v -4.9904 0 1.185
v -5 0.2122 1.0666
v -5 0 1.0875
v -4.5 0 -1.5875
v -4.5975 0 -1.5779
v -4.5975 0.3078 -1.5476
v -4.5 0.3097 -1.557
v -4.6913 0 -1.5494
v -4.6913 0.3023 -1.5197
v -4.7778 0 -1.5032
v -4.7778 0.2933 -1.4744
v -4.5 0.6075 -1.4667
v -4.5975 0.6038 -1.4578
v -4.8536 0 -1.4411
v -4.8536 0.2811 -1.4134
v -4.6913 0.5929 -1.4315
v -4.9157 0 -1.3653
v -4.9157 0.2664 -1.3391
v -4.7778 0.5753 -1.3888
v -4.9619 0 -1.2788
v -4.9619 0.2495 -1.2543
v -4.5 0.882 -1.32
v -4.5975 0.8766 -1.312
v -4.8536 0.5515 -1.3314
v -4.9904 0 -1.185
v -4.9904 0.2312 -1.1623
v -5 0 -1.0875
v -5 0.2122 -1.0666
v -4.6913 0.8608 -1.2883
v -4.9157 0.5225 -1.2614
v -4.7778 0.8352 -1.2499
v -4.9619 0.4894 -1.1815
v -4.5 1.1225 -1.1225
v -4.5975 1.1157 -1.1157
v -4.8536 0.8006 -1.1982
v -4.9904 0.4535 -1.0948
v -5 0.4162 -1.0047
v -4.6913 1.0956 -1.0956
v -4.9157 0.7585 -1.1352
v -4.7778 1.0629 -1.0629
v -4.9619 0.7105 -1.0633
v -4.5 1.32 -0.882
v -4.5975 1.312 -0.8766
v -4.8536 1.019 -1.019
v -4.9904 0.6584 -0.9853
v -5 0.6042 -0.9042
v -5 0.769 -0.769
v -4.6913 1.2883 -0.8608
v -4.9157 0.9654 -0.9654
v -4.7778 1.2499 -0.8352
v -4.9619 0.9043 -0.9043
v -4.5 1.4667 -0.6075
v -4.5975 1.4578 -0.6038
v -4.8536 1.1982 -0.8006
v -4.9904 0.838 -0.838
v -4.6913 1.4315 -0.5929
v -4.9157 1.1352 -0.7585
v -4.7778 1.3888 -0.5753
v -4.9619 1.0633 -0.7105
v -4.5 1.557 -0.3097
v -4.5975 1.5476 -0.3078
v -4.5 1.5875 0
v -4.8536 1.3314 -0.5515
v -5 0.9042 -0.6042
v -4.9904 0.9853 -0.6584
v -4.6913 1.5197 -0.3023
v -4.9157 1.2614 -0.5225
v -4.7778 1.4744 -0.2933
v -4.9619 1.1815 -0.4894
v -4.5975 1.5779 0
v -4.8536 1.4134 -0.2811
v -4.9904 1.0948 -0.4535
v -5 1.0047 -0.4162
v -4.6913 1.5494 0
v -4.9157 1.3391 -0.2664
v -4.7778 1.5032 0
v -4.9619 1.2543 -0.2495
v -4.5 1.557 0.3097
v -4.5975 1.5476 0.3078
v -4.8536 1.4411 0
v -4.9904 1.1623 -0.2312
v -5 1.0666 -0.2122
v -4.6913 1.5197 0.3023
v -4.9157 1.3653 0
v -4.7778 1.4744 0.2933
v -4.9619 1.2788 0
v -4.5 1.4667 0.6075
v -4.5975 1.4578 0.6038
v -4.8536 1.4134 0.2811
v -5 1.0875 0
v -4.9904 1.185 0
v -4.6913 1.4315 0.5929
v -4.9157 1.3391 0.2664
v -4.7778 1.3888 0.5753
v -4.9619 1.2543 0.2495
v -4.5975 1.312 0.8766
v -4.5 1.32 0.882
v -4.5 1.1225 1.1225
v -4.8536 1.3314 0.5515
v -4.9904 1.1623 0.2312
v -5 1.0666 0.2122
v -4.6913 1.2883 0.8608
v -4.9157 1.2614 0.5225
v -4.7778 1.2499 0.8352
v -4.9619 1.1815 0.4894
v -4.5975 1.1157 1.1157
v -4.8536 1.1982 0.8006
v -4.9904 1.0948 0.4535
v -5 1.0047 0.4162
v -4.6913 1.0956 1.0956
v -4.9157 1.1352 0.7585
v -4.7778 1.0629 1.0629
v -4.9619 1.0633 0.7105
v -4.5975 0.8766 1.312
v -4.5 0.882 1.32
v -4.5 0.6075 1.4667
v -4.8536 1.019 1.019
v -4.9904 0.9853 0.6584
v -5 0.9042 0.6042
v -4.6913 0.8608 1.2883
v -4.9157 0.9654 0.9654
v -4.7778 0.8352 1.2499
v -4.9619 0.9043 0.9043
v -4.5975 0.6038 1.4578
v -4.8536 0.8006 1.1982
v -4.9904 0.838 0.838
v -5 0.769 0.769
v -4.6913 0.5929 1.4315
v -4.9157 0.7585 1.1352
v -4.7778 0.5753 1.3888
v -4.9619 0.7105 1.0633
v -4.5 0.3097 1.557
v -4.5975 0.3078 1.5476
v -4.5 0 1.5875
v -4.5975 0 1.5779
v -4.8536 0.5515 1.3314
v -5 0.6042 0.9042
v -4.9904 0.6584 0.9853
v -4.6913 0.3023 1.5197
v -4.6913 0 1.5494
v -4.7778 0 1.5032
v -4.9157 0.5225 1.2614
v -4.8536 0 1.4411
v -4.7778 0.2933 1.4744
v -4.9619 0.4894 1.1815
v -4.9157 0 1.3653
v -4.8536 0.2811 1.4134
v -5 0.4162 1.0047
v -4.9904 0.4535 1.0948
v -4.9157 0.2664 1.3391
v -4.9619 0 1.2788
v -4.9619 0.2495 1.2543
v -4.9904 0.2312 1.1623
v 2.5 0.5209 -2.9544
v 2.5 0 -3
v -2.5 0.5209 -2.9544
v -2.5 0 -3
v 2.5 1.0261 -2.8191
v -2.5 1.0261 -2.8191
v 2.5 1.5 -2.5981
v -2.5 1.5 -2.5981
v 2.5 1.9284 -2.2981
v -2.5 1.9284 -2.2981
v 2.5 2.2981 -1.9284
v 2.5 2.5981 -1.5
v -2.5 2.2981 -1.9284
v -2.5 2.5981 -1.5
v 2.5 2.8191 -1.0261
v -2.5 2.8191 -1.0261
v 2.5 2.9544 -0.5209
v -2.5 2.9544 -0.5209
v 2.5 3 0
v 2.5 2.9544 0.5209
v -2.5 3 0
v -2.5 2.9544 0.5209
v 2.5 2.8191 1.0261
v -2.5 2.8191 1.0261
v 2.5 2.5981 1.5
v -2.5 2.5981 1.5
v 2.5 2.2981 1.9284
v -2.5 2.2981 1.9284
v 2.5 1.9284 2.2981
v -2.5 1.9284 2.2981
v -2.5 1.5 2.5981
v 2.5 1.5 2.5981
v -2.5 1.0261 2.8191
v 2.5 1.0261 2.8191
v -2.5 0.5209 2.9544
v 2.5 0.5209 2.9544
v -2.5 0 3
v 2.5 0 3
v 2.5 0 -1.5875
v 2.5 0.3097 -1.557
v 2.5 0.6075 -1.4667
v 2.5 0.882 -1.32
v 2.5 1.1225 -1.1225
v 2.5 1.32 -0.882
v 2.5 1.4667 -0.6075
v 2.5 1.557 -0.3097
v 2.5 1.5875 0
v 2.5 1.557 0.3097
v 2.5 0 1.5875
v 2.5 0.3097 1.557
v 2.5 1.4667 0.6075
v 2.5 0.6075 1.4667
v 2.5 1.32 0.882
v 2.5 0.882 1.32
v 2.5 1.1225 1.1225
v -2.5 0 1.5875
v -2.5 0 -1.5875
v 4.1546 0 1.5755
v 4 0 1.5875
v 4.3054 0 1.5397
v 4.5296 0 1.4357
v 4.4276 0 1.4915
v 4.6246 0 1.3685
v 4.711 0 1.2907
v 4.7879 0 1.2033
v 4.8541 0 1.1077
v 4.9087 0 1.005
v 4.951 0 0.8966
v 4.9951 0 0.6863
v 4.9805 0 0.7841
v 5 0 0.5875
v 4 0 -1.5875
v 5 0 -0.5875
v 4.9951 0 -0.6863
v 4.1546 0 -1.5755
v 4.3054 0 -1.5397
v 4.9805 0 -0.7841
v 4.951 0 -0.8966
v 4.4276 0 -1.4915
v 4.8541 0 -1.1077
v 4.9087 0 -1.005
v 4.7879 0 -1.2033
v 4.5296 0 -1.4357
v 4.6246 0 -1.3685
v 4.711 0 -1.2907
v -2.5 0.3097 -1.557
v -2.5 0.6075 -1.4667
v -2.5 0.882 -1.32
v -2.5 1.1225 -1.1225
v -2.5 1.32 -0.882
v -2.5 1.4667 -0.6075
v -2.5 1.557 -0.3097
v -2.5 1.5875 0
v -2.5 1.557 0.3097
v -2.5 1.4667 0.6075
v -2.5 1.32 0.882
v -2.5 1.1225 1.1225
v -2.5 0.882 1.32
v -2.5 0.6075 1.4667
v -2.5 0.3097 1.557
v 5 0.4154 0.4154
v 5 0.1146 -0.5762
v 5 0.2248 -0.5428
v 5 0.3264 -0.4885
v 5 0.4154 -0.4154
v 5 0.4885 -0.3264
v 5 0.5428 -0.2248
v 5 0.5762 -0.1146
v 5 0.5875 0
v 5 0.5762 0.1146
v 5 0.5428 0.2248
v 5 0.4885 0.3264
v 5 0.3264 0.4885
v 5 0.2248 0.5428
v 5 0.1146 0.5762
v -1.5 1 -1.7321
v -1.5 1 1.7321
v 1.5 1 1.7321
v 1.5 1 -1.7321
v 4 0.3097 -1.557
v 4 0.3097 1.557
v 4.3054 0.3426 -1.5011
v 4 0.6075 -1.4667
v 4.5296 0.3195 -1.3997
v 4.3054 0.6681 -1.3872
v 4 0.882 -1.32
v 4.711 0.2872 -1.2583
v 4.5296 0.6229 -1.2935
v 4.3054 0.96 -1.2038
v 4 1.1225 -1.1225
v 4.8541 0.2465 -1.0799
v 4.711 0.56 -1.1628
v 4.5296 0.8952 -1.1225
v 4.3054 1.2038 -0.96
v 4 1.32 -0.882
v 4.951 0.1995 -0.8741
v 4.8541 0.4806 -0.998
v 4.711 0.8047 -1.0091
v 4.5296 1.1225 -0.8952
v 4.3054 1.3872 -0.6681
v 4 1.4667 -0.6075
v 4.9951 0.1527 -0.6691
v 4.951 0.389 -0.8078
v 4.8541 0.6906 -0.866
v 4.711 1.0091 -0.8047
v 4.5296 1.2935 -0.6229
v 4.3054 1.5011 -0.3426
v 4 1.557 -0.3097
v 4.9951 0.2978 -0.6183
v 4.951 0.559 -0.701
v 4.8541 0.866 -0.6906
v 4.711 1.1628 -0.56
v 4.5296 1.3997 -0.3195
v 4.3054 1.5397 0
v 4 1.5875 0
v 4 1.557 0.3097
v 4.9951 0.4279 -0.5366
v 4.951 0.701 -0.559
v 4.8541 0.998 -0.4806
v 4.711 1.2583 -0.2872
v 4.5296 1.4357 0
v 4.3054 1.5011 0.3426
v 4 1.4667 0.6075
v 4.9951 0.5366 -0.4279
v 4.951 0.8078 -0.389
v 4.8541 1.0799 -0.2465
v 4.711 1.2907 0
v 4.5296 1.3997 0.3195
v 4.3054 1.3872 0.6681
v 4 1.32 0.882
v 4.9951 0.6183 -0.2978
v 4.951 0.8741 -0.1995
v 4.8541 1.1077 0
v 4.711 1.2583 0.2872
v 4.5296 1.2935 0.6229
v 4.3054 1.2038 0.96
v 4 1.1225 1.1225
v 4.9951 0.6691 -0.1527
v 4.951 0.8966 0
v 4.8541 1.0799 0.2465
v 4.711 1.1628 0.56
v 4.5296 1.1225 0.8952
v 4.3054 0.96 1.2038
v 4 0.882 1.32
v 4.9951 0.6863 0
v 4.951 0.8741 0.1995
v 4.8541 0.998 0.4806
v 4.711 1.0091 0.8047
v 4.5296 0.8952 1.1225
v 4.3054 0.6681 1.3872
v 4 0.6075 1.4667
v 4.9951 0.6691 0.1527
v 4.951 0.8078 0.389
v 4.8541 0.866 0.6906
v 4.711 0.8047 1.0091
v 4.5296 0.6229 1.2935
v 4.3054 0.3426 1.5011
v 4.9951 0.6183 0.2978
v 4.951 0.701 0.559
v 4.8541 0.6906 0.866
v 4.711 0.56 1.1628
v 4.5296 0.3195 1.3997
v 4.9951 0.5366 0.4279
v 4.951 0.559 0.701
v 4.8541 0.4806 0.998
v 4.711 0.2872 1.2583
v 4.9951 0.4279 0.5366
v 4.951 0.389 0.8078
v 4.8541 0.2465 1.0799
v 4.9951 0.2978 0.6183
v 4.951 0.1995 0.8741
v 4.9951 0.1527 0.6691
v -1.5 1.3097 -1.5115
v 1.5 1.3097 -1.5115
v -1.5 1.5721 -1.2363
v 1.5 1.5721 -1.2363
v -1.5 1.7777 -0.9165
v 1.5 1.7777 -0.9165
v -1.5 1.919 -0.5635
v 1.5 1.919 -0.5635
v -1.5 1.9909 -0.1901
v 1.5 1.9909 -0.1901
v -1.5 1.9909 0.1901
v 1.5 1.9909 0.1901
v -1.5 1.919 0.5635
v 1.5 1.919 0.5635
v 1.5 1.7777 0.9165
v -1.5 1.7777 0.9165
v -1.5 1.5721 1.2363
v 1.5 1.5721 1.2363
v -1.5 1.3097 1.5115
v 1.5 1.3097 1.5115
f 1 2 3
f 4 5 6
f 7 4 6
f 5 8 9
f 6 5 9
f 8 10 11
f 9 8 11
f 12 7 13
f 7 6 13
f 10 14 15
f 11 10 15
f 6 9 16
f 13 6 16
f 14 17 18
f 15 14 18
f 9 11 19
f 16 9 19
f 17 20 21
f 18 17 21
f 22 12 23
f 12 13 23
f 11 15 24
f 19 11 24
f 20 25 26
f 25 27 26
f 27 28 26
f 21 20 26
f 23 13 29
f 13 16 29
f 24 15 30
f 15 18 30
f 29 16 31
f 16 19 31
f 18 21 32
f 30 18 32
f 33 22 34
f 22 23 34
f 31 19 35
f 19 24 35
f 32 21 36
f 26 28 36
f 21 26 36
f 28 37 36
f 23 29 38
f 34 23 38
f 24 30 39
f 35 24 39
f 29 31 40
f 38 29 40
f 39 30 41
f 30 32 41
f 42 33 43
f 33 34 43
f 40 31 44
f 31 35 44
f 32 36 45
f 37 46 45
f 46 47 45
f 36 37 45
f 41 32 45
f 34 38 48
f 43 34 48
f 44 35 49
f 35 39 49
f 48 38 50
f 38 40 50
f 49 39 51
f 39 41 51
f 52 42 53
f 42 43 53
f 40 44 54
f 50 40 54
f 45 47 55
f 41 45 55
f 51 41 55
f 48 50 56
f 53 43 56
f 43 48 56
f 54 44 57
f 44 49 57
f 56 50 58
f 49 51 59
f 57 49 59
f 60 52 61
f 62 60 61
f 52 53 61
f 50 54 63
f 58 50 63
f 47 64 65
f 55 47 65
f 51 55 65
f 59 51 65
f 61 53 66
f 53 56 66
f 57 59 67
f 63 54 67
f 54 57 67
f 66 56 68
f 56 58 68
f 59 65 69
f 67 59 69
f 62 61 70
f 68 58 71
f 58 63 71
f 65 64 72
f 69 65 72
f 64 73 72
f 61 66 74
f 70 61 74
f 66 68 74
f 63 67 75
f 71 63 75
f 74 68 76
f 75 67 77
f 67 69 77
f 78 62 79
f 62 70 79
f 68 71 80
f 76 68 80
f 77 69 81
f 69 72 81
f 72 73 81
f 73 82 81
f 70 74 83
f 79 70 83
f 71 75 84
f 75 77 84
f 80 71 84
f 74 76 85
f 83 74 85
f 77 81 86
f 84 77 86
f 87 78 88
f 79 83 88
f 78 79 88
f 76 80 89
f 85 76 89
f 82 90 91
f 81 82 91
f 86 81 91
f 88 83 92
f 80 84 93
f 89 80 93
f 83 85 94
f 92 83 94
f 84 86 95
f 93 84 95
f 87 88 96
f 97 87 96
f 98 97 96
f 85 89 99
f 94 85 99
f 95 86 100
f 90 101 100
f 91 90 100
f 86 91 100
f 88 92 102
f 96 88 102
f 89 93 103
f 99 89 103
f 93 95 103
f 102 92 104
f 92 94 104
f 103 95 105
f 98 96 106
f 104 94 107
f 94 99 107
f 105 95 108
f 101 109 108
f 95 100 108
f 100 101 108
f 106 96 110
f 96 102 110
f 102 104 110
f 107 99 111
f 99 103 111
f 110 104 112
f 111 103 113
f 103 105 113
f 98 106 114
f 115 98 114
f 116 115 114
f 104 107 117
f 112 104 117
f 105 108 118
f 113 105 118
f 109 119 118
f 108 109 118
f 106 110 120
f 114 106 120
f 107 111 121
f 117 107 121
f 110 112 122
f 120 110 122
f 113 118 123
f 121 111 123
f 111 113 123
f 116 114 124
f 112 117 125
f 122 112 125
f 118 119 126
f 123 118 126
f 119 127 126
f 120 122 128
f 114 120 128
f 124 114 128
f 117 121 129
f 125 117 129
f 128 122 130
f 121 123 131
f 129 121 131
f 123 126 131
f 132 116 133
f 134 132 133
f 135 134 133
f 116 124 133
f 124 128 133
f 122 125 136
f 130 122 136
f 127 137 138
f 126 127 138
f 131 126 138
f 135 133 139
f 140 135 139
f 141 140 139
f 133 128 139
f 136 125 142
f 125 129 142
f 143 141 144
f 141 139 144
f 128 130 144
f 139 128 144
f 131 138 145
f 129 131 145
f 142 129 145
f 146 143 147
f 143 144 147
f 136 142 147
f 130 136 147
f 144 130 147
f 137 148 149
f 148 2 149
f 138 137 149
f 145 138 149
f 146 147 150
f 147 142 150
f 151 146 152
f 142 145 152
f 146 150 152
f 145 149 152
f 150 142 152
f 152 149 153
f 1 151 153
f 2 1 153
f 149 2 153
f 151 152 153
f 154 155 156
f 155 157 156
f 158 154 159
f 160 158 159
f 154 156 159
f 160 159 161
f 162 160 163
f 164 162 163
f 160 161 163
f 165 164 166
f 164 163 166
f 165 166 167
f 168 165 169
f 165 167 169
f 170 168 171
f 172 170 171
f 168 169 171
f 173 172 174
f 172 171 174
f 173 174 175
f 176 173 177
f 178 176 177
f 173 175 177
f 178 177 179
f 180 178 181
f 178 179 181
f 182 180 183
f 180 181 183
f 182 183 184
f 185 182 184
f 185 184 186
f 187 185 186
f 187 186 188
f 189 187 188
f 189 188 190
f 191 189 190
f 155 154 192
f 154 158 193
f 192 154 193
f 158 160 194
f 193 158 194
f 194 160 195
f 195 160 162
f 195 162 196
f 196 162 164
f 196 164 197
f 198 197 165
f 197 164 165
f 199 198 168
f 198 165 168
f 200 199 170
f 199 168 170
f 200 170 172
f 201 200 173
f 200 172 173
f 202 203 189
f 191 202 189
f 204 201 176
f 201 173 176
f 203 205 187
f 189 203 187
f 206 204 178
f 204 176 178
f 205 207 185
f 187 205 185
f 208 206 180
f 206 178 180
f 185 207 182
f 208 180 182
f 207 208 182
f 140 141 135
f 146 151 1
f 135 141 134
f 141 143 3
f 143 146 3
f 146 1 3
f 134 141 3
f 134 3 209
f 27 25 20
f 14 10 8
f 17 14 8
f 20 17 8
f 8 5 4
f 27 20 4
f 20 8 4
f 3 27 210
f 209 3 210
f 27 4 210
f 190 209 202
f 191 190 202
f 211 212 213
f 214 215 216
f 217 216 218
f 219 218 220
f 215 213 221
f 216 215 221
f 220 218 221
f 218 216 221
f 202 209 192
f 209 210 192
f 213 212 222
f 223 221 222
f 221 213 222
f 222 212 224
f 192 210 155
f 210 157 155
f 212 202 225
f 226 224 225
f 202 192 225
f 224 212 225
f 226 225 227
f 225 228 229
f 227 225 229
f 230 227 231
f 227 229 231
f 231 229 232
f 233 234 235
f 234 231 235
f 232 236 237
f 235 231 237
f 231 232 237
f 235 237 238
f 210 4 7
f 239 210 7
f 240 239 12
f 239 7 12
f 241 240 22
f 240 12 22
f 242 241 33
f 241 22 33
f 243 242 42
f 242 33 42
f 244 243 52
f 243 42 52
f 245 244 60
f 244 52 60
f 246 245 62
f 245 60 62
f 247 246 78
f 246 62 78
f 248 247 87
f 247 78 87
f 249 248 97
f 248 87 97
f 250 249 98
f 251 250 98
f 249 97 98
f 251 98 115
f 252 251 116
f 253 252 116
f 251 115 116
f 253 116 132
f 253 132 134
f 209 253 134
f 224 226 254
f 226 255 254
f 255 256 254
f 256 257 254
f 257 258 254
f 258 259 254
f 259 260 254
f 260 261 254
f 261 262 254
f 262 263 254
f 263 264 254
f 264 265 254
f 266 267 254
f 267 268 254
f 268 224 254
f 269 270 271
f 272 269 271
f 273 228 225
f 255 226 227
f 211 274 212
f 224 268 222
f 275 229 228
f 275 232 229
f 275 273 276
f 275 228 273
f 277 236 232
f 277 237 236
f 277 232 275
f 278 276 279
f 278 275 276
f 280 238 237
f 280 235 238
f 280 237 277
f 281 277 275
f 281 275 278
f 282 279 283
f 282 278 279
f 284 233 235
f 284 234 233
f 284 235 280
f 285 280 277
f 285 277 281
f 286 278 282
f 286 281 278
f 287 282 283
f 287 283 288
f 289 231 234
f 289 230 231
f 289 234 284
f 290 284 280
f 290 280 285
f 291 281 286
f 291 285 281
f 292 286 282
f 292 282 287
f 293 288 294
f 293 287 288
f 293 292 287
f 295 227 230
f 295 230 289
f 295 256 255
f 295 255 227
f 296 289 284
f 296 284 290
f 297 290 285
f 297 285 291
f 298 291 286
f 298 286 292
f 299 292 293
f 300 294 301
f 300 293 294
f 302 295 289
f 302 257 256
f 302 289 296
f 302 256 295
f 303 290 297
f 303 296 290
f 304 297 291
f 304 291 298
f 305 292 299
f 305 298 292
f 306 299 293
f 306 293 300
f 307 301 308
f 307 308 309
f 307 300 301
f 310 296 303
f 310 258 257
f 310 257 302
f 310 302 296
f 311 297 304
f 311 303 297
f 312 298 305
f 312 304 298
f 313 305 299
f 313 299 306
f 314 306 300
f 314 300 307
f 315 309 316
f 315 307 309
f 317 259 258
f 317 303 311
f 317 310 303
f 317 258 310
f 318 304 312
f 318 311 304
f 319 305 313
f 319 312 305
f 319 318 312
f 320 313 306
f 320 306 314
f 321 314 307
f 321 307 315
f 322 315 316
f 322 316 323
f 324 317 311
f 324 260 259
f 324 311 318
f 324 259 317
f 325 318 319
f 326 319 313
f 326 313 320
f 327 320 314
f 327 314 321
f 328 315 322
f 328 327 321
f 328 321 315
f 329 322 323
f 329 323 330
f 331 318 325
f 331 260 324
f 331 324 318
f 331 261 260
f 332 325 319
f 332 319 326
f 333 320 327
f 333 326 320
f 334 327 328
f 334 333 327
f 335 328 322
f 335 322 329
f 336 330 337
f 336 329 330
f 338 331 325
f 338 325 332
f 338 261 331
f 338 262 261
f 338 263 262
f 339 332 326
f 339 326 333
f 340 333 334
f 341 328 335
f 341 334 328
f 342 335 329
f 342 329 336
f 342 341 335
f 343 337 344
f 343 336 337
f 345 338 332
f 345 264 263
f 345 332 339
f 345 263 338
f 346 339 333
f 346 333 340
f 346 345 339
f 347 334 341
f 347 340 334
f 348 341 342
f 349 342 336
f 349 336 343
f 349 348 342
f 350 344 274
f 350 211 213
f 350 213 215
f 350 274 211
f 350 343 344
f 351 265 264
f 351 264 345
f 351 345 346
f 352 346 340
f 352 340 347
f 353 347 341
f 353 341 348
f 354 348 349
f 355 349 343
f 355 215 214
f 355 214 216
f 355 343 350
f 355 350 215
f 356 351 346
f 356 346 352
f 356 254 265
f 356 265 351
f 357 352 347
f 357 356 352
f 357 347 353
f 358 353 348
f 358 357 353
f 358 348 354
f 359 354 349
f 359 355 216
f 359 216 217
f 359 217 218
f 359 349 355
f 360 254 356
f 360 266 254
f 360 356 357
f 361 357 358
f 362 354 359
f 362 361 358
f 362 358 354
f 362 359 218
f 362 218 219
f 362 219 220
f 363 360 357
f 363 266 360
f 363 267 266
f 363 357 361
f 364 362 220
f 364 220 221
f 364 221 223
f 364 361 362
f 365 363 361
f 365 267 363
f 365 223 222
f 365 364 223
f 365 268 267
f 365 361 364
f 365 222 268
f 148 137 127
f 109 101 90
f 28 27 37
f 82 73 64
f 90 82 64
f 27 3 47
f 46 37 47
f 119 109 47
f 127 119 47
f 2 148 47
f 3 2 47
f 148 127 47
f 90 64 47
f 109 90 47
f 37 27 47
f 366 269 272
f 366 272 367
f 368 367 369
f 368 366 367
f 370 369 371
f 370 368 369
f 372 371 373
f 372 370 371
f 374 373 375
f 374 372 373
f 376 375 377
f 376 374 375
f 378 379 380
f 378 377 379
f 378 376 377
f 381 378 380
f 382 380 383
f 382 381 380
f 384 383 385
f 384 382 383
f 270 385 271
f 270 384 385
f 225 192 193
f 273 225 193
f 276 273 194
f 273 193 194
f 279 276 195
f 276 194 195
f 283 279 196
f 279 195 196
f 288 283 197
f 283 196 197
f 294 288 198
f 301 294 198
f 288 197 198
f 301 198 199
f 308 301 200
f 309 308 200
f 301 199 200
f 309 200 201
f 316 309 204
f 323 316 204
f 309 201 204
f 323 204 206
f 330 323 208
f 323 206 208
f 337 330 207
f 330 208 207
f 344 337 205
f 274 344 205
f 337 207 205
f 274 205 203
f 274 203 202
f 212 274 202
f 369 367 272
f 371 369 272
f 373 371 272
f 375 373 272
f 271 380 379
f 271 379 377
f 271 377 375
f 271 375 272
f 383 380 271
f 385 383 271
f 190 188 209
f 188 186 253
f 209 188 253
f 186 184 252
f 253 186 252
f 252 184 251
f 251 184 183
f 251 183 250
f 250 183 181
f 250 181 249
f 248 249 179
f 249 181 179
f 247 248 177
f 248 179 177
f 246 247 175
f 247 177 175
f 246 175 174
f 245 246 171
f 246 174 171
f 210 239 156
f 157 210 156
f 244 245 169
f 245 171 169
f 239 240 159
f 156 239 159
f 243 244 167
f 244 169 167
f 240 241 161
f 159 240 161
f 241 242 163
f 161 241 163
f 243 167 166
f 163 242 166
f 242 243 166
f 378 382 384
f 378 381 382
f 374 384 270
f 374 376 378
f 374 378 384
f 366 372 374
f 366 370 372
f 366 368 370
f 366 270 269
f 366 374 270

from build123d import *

# Parameters (mm, degrees)
F1_ANGLE_BACK = 90
F1_ANGLE      = 180
F2_T          = 1
F2_T4_ANGLE   = 180.000000001
F2_T6_ANGLE   = 180.000000001
F3_R          = 1
F4_R          = 0.5


# Not quite as in the source:
# - a feature of the source that left no trace in its solid (it failed there, or was rolled back) is left out
# - a shell that OpenCascade refuses in one call is made with other operations: the cavity is built on its own and cut out


with BuildPart() as f1:
    # F0 (on Top) → F1 (revolve)
    with BuildSketch(Plane.XY, mode=Mode.PRIVATE) as f1_sk:
        Polygon((-2.5, 1.5875), (-5, 1.5875), (-5, 0), (5, 0), (5, 1.5875), (2.5, 1.5875), (2.5, 3), (-2.5, 3), align=None)
    revolve(f1_sk.sketch.rotate(Axis((0.2477309544, 0, 0), (1, 0, 0)), -F1_ANGLE_BACK), axis=Axis((0.2477309544, 0, 0), (1, 0, 0)), revolution_arc=F1_ANGLE)

    # F2: shell of thickness 1, made by hand


with BuildPart() as f2_core1:
    # F2_t2: copy of F1
    add(f1.part)

    # the walls: a layer under each face that stays
    f2_faces = [f2_core1.faces().sort_by_distance(p)[0] for p in [
        (-3.75, 1.5875, 0),
        (0, 0, 0),
        (3.75, 1.5875, 0),
        (2.5, 0.5, -2),
        (0, 3, 0),
        (-2.5, 0.5, 2),
    ]]
    thicken(f2_faces, amount=-F2_T, mode=Mode.SUBTRACT)

    # F2_s3 → F2_t4 (revolve, cut)
    with BuildSketch(Plane.XZ):
        Polygon((-2.51, -1.5975), (-2.5, -0.5875), (-1.5, -0.5875), (-1.5, -1.5875), align=None)
    revolve(axis=Axis((-2.5, 0, 0), (1, 0, 0)), revolution_arc=F2_T4_ANGLE, mode=Mode.SUBTRACT)

    # F2_s5 → F2_t6 (revolve, cut)
    with BuildSketch(Plane.XZ):
        Polygon((2.51, -1.5975), (2.5, -0.5875), (1.5, -0.5875), (1.5, -1.5875), align=None)
    revolve(axis=Axis((2.5, 0, 0), (1, 0, 0)), revolution_arc=F2_T6_ANGLE, mode=Mode.SUBTRACT)


with BuildPart() as f1_1:
    add(f1.part)

    # what is left inside the walls is the cavity
    f2_cavity = [f2_core1.part.solids().sort_by_distance(p)[0] for p in [
        (0.5, 1.99, 0),
    ]]
    add(f2_cavity, mode=Mode.SUBTRACT)

    # F3
    f3_edges = [f1_1.edges().sort_by_distance(p)[0] for p in [
        (5, 1.5875, 0),
    ]]
    fillet(f3_edges, radius=F3_R)

    # F4
    f4_edges = [f1_1.edges().sort_by_distance(p)[0] for p in [
        (-5, 1.5875, 0),
    ]]
    fillet(f4_edges, radius=F4_R)


solid = f1_1.part
